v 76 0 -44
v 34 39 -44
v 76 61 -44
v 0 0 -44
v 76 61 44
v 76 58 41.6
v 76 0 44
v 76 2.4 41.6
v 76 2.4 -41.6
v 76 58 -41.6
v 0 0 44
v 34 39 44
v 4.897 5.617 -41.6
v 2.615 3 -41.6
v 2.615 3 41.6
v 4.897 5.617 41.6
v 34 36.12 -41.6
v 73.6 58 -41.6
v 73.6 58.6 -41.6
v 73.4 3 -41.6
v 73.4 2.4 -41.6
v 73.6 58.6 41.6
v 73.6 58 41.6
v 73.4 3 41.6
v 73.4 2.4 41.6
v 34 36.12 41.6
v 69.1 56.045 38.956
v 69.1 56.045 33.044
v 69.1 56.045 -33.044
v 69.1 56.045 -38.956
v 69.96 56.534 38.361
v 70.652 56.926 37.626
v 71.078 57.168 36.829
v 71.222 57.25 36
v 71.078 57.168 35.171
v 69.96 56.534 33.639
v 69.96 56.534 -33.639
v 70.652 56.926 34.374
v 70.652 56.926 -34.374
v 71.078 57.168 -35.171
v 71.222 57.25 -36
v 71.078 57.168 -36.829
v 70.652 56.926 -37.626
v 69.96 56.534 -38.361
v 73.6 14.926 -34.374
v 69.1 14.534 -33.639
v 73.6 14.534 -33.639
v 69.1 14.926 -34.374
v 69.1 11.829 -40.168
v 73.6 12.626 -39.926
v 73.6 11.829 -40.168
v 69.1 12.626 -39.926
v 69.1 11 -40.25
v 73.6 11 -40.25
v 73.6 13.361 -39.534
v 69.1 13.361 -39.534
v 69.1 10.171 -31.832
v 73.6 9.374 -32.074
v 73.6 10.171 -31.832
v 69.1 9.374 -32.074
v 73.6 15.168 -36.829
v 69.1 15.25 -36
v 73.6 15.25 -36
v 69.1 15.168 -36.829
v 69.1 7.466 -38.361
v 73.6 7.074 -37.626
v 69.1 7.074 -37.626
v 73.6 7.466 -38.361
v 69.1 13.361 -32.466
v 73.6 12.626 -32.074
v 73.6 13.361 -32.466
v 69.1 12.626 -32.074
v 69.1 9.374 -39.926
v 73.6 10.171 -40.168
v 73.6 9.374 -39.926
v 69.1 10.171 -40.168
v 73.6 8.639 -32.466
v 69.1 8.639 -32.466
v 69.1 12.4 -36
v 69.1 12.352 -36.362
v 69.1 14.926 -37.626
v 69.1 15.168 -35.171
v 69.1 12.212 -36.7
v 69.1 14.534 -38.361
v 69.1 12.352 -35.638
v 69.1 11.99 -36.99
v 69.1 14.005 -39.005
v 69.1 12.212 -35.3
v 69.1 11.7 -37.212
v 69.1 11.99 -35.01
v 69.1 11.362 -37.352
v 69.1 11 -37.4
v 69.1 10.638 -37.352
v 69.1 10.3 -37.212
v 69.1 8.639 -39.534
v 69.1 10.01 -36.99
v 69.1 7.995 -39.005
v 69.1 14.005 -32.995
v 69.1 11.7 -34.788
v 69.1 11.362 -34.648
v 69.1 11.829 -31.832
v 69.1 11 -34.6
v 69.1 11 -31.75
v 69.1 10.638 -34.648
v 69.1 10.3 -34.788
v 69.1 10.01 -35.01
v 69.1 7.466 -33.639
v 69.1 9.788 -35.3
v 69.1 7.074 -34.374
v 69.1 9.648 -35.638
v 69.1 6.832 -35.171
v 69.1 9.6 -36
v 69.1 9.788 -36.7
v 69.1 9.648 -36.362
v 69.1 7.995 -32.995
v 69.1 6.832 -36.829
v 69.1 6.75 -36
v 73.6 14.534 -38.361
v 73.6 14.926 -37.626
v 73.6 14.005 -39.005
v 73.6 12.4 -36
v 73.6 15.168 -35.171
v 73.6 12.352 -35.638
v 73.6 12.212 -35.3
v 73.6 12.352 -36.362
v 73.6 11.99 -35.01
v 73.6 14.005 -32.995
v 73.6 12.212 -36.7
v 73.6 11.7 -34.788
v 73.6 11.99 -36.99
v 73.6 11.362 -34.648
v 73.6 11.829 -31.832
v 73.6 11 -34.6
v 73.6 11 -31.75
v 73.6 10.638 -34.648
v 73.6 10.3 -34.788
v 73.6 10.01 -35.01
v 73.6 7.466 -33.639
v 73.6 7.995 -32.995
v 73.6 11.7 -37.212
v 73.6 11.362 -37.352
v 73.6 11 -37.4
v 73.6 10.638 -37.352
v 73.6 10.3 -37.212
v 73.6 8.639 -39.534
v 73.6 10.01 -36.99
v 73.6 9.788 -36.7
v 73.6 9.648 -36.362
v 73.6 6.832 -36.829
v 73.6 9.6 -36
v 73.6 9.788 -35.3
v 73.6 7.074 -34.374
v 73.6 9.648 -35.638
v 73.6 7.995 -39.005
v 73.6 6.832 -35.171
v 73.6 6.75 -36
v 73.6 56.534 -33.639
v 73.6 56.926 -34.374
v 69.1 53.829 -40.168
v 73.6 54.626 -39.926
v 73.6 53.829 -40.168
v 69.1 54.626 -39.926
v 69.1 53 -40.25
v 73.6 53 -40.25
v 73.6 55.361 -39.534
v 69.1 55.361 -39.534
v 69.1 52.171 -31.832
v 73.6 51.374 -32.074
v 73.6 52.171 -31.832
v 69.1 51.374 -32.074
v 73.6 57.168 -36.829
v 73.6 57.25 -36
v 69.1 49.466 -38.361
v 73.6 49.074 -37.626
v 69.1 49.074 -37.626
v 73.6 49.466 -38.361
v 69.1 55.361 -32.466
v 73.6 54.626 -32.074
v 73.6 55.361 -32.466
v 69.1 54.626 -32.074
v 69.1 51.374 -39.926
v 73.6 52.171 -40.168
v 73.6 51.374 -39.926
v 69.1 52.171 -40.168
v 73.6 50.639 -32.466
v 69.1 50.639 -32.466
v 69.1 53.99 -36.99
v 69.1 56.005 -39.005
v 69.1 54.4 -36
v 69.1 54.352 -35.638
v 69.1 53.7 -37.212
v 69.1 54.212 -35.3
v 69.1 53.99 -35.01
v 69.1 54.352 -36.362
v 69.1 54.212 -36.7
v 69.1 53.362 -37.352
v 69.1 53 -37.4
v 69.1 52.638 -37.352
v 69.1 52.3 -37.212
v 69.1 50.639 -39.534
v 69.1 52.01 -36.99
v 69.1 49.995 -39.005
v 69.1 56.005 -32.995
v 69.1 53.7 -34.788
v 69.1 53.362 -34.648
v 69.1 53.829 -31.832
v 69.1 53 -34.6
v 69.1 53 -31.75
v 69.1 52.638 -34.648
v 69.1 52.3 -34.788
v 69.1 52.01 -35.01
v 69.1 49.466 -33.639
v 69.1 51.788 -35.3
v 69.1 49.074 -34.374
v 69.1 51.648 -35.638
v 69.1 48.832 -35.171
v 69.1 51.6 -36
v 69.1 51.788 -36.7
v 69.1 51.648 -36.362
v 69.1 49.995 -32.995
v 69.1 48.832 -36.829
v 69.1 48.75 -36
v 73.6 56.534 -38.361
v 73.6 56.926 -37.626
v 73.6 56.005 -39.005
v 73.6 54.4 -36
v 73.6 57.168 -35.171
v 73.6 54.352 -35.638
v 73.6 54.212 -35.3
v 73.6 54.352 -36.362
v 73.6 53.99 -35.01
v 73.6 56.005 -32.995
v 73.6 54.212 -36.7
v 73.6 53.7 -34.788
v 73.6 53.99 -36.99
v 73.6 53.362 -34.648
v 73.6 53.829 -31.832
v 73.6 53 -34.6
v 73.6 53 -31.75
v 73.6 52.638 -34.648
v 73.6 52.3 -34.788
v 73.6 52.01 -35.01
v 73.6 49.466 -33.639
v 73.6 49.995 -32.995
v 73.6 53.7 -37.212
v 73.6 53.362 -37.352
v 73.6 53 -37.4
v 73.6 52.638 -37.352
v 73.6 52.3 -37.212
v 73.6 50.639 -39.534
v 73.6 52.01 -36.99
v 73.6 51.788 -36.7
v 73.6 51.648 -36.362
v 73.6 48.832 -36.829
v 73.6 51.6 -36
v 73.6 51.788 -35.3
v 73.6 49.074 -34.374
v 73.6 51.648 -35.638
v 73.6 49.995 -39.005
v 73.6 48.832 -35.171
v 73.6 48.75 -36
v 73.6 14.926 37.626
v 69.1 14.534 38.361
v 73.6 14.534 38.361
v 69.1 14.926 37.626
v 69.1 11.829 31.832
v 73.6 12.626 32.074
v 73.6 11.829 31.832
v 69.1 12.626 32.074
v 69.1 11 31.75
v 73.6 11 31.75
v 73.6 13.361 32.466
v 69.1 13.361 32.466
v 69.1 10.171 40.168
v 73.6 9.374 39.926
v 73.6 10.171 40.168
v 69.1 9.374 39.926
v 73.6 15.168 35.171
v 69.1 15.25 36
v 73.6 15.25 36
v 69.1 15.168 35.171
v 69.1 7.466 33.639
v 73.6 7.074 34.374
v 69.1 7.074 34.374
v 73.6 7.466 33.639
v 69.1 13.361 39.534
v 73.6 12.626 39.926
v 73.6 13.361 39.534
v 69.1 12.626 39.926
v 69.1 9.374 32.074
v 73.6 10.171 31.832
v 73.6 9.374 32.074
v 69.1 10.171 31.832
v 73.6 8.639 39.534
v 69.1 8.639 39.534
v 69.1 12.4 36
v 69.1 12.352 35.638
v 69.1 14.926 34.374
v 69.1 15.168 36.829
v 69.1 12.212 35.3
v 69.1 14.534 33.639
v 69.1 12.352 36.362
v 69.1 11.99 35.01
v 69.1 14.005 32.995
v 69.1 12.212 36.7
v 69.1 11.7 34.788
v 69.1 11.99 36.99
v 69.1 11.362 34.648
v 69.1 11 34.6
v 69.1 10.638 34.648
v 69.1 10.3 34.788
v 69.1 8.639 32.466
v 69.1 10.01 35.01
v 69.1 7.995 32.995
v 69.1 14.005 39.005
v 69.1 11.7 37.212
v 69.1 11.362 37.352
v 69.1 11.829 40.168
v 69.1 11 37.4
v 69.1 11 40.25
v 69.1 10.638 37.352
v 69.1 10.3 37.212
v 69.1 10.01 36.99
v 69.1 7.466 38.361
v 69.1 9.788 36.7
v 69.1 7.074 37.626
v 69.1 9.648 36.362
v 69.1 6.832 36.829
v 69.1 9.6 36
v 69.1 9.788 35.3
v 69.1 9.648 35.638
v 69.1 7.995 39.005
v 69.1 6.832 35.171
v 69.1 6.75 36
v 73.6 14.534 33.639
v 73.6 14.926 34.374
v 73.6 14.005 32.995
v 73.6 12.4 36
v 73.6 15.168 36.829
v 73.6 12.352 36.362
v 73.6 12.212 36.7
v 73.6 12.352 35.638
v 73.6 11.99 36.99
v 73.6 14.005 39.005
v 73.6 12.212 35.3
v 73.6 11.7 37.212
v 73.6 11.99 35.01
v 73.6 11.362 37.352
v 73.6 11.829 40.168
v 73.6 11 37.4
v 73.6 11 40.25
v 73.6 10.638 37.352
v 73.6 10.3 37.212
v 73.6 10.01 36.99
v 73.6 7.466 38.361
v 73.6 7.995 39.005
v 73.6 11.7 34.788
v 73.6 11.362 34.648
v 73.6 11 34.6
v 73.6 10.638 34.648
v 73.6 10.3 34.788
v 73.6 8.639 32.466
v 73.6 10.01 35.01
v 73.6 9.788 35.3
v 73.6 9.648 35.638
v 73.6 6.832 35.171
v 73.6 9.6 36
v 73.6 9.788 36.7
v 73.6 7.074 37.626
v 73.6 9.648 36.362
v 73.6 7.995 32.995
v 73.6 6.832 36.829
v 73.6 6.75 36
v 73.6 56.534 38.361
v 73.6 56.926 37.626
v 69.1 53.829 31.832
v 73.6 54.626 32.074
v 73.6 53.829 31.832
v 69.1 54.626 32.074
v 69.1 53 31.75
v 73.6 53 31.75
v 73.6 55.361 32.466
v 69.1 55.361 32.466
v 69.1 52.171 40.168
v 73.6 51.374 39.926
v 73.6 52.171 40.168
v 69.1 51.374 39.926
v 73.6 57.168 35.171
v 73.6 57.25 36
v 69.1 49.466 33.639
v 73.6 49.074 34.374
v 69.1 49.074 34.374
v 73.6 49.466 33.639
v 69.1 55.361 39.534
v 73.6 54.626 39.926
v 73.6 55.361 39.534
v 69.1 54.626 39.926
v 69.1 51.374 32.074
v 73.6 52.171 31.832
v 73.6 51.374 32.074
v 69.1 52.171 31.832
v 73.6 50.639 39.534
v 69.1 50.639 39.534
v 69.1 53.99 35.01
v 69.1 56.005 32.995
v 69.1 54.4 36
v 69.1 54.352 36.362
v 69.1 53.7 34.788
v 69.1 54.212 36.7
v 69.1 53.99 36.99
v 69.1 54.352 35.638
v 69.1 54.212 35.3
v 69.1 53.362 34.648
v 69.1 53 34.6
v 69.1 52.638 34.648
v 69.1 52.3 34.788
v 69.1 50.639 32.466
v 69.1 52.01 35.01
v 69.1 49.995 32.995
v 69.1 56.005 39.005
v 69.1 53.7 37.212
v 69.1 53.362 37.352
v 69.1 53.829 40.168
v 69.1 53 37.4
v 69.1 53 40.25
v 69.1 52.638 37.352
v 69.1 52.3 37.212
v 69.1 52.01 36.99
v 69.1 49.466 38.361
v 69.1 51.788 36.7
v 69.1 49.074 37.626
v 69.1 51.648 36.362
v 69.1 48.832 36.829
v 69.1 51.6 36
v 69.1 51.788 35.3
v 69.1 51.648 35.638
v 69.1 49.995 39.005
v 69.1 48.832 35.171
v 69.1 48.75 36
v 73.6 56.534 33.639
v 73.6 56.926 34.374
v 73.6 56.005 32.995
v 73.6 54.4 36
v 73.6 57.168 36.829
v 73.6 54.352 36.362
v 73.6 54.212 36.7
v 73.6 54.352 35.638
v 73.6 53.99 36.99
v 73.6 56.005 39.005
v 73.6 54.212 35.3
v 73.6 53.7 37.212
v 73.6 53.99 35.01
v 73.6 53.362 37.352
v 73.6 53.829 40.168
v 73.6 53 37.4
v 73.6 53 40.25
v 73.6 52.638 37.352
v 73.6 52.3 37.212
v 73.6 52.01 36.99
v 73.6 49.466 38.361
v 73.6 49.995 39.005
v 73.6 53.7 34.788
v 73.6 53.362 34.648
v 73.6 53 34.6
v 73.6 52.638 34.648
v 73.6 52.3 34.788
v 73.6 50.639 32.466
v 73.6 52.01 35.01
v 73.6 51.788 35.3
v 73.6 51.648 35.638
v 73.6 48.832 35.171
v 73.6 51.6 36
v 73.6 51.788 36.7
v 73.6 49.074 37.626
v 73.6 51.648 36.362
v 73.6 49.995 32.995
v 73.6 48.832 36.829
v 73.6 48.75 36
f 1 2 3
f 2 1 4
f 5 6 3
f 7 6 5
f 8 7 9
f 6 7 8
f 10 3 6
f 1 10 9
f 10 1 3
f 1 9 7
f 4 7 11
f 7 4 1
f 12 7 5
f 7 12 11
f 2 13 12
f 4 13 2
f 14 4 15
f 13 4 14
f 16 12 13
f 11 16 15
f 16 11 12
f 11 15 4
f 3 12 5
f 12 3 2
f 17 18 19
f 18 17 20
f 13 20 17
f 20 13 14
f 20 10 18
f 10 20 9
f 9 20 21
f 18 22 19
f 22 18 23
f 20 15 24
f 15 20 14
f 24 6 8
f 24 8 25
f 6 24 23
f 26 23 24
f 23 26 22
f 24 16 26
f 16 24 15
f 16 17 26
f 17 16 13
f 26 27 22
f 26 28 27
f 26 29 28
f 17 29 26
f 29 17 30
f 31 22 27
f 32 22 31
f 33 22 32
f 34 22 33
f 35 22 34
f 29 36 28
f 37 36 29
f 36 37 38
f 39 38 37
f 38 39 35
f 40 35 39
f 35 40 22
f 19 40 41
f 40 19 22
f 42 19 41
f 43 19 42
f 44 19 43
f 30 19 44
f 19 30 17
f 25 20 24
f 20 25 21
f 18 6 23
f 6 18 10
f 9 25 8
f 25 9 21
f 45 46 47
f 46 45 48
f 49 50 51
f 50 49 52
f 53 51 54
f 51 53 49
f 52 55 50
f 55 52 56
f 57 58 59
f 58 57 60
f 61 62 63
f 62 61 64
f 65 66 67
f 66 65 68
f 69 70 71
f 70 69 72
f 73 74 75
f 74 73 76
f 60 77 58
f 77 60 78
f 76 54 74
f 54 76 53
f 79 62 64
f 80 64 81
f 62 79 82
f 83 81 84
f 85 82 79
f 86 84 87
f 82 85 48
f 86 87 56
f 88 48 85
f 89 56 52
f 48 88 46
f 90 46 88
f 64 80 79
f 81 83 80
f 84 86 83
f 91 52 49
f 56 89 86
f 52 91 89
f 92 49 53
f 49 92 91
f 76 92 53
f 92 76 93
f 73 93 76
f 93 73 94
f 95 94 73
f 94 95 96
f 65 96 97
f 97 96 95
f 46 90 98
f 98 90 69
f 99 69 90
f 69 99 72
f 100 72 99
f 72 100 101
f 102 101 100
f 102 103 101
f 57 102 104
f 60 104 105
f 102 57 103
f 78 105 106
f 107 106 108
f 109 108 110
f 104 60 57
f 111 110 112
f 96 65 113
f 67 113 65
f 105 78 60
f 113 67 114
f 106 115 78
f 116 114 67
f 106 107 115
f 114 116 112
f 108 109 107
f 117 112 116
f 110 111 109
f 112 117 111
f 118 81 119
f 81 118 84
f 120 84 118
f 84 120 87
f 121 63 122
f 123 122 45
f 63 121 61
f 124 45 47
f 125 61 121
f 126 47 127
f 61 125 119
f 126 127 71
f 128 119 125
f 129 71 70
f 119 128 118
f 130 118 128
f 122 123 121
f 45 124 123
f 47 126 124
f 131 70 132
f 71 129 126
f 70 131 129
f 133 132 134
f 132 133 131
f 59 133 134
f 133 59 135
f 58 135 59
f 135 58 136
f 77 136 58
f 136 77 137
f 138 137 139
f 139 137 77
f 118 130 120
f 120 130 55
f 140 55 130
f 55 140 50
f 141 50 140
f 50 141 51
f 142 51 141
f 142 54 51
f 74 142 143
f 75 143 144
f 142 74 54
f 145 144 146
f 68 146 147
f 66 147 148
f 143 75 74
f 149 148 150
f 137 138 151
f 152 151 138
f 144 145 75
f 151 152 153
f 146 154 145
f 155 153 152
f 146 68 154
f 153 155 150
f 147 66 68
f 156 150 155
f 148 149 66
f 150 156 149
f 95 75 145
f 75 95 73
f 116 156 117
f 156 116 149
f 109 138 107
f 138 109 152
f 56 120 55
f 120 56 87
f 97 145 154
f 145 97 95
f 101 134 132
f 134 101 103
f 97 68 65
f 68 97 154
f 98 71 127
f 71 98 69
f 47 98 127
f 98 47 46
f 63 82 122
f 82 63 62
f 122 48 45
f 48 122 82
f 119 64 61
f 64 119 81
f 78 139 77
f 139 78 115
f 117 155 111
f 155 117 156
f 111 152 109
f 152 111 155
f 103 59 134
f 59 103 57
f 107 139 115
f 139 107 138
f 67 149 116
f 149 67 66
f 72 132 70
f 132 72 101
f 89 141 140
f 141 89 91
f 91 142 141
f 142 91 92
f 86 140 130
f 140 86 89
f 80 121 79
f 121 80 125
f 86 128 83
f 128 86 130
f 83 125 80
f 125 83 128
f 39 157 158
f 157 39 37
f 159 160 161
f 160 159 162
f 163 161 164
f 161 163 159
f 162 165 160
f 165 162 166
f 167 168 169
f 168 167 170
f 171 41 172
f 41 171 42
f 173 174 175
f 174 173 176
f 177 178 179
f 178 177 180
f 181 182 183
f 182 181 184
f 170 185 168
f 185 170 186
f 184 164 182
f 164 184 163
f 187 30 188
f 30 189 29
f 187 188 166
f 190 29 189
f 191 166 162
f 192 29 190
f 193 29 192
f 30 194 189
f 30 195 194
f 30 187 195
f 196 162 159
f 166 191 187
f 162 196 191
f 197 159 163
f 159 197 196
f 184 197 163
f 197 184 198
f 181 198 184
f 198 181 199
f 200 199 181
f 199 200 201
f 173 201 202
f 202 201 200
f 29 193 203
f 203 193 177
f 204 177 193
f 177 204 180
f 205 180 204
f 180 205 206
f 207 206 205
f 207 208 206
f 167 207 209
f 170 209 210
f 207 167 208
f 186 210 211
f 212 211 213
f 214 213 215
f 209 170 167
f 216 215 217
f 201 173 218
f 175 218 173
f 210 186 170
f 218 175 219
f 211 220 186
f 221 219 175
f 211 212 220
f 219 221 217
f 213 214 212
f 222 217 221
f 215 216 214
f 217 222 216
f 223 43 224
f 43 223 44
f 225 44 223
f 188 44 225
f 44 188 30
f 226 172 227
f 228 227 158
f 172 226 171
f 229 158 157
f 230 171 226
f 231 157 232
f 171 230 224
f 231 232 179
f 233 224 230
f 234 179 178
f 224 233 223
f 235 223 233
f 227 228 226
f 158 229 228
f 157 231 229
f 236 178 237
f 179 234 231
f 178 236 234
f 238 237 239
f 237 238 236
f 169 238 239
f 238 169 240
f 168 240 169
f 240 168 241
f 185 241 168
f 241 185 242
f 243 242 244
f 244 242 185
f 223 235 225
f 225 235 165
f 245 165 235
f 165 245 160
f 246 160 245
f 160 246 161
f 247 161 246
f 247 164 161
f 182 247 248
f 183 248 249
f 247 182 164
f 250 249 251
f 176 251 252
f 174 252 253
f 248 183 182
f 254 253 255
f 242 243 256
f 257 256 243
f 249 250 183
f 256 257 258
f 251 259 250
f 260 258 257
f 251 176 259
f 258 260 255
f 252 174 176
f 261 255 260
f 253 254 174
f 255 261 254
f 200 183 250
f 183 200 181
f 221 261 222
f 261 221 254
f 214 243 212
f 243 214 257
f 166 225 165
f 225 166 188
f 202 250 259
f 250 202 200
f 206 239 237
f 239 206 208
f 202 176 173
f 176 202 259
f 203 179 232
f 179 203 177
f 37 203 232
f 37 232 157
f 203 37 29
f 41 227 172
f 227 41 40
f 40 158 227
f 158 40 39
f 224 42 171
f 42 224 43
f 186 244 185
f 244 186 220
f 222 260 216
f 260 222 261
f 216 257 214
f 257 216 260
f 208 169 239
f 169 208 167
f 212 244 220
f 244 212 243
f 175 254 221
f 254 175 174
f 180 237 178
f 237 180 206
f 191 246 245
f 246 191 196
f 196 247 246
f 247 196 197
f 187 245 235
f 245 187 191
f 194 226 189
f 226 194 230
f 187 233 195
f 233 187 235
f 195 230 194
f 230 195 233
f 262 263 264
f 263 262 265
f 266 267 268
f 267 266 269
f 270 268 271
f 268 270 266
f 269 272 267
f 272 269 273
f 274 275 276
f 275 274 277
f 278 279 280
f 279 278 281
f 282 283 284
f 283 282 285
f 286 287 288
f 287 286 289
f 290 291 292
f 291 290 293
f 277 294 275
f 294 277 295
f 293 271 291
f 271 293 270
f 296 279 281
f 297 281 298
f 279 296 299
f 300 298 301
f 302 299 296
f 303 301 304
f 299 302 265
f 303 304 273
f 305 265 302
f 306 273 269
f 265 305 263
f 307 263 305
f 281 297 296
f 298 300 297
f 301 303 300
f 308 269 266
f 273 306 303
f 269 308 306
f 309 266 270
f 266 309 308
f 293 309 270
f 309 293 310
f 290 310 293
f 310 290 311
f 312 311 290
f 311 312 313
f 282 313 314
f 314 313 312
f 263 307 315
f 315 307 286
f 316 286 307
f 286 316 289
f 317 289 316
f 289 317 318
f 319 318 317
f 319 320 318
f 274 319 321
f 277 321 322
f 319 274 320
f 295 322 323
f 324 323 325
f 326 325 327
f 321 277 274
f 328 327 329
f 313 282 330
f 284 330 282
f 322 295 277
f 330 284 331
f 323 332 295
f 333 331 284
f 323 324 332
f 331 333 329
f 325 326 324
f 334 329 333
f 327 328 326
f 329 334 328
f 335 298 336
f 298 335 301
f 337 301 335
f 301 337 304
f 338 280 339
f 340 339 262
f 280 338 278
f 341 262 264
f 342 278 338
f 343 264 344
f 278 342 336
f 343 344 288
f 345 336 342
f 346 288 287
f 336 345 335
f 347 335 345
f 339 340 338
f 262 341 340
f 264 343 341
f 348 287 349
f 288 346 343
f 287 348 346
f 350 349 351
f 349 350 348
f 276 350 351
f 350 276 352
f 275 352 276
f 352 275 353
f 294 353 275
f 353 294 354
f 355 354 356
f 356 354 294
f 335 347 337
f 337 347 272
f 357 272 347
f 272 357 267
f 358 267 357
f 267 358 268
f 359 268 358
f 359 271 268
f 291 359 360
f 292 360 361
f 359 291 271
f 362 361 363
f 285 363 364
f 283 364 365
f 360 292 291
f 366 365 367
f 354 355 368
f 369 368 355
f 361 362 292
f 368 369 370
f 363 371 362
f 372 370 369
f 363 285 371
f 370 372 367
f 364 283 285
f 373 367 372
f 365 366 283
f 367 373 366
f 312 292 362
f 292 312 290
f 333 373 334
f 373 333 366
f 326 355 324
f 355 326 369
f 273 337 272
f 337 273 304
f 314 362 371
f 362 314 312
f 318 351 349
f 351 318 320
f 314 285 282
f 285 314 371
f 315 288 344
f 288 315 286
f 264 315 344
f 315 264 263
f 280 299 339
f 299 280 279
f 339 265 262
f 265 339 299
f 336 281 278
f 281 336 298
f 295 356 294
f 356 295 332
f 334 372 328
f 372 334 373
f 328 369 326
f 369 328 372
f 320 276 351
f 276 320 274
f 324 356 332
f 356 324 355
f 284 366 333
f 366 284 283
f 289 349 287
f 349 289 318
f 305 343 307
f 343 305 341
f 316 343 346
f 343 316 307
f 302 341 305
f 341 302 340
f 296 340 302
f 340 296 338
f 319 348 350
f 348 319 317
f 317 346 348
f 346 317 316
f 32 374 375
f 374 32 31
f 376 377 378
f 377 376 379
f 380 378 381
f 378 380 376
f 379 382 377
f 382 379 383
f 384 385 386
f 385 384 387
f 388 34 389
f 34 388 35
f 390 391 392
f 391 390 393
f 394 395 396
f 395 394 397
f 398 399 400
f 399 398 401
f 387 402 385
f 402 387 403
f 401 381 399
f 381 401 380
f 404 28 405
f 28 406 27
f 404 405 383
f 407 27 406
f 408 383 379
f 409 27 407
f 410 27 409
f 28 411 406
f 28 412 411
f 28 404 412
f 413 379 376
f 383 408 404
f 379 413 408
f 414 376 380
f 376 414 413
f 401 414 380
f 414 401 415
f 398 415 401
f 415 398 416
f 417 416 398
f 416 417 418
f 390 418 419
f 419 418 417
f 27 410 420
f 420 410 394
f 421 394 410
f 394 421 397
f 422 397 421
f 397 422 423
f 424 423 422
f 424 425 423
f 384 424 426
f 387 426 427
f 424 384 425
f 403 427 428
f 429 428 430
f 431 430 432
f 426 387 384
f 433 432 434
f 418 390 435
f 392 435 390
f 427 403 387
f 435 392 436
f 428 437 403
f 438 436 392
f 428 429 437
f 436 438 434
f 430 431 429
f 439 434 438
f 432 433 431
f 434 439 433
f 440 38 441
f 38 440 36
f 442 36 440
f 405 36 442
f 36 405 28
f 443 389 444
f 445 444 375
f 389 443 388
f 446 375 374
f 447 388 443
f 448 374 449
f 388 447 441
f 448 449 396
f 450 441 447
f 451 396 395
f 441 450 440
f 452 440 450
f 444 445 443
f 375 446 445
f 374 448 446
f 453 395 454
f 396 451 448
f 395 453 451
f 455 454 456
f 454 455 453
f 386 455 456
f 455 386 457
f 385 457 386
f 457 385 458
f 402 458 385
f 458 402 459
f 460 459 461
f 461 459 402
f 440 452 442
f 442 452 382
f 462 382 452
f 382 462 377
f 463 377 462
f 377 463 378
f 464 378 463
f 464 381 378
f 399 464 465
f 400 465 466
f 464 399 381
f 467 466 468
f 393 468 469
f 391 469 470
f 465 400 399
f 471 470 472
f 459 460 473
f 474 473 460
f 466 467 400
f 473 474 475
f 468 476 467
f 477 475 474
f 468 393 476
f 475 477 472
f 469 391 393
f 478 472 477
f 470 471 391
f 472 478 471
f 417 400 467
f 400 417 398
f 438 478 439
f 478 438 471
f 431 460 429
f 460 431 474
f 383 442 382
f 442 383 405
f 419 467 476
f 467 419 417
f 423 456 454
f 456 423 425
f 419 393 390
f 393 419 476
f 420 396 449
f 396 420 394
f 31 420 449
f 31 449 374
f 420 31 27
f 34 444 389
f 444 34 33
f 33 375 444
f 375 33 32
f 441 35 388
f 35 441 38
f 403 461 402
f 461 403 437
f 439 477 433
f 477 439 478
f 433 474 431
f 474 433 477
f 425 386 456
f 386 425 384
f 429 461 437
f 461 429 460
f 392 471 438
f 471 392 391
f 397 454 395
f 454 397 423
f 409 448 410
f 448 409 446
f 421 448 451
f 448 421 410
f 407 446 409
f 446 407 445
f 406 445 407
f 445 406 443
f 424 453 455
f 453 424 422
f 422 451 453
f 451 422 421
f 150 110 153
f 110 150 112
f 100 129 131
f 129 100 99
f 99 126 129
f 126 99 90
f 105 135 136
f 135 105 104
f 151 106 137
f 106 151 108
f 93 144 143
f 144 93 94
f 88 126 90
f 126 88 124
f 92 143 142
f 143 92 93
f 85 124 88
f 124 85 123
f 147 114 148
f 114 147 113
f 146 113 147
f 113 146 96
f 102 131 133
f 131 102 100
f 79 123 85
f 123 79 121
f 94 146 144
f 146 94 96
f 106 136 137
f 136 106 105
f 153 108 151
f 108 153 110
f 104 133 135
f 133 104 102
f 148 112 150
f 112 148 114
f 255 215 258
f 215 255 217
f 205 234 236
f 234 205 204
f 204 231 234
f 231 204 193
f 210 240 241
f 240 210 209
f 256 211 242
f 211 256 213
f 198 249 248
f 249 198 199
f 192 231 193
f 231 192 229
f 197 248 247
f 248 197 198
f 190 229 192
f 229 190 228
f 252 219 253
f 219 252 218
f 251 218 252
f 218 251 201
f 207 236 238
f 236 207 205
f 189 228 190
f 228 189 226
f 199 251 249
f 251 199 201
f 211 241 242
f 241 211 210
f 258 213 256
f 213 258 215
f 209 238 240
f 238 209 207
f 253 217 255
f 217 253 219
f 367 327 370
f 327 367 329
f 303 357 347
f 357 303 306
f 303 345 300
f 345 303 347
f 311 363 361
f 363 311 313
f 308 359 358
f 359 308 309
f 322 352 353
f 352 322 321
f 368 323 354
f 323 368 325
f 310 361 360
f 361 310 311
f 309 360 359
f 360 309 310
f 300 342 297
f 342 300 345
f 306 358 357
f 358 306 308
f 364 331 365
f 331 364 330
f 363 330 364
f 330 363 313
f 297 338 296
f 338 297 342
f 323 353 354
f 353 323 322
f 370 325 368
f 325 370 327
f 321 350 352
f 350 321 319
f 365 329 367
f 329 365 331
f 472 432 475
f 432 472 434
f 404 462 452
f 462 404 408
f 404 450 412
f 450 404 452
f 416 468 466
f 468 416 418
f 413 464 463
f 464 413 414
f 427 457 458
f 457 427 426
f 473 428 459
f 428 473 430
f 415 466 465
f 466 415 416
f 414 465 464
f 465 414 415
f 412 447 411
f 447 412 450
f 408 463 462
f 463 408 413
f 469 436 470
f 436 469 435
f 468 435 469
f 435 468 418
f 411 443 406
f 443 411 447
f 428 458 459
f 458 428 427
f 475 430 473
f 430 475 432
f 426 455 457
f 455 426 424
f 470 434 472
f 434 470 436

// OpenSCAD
// PCMonitorX sloped desktop stand. Units: mm.
// OLED/ESP32 physical dimensions remain undefined until measured.

part = "body"; // "body", "cover", or "both"
preview_only = true; // Enables shell-only preview before dimensions are recorded.

case_width = 88;
case_depth = 76;
front_rise = 39;
back_height = 61;
wall = 2.4;
floor = 3.0;
rear_cover_thickness = 2.4;
cover_clearance = 0.25;
screw_clearance = 2.8;
screw_head_diameter = 5.5;
vent_slot_width = 2.0;
vent_pitch = 5.0;
standoff_height = 5.0;
standoff_diameter = 6.5;
mount_screw_clearance = 2.4;

// Fill these from hardware/measurement_worksheet.md; do not derive from diagonal size.
oled_pcb_width = undef;
oled_pcb_height = undef;
oled_pcb_thickness = undef;
oled_window_width = undef;
oled_window_height = undef;
oled_window_offset_x = undef; // from PCB left edge
oled_window_offset_y = undef; // from PCB top edge
oled_hole_spacing_x = undef;
oled_hole_spacing_y = undef;
oled_hole_offset_x = undef; // hole-pattern centre offset from PCB centre, across width
oled_hole_offset_y = undef; // hole-pattern centre offset from PCB centre, along height
esp32_board_width = undef;
esp32_board_length = undef;
esp32_hole_spacing_x = undef;
esp32_hole_spacing_y = undef;
esp32_hole_offset_x = undef; // hole-pattern centre offset from PCB centre, across width
esp32_hole_offset_y = undef; // hole-pattern centre offset from PCB centre, along length
esp32_board_center_depth = 45;
esp32_board_center_width = 0;

// Measure the complete plastic two-cell holder, not the bare cell dimensions.
battery_holder_depth = undef; // along case depth (X)
battery_holder_width = undef; // across case width (Z)
battery_holder_height = undef; // above inside floor (Y)
battery_holder_center_depth = undef; // X position; place the open end toward removable rear cover
battery_holder_center_width = undef; // Z position
battery_bay_clearance = 0.7;
battery_rail_thickness = 2.0;
battery_rail_height = 3.0;

// Buck converter uses four measured board holes; use a separate insulating support if it has none.
buck_board_length = undef;
buck_board_width = undef;
buck_board_height = undef;
buck_hole_spacing_depth = undef;
buck_hole_spacing_width = undef;
buck_hole_offset_depth = undef;
buck_hole_offset_width = undef;
buck_board_center_depth = undef;
buck_board_center_width = undef;
buck_mount_screw_clearance = 2.4;

// Optional 2S protection board; needed if the holder/cells are not already a protected 2S assembly.
bms_board_length = undef;
bms_board_width = undef;
bms_board_height = undef;
bms_hole_spacing_depth = undef;
bms_hole_spacing_width = undef;
bms_hole_offset_depth = undef;
bms_hole_offset_width = undef;
bms_board_center_depth = undef;
bms_board_center_width = undef;
bms_mount_screw_clearance = 2.4;

oled_ready = !is_undef(oled_pcb_width) && !is_undef(oled_pcb_height) &&
             !is_undef(oled_pcb_thickness) && !is_undef(oled_window_width) &&
             !is_undef(oled_window_height) && !is_undef(oled_window_offset_x) &&
             !is_undef(oled_window_offset_y);
oled_mount_ready = oled_ready && !is_undef(oled_hole_spacing_x) &&
                   !is_undef(oled_hole_spacing_y) && !is_undef(oled_hole_offset_x) &&
                   !is_undef(oled_hole_offset_y);
esp_ready = !is_undef(esp32_board_width) && !is_undef(esp32_board_length) &&
            !is_undef(esp32_hole_spacing_x) && !is_undef(esp32_hole_spacing_y) &&
            !is_undef(esp32_hole_offset_x) && !is_undef(esp32_hole_offset_y);
battery_ready = !is_undef(battery_holder_depth) && !is_undef(battery_holder_width) &&
                !is_undef(battery_holder_height) && !is_undef(battery_holder_center_depth) &&
                !is_undef(battery_holder_center_width);
buck_ready = !is_undef(buck_board_length) && !is_undef(buck_board_width) &&
             !is_undef(buck_board_height) && !is_undef(buck_hole_spacing_depth) &&
             !is_undef(buck_hole_spacing_width) && !is_undef(buck_hole_offset_depth) &&
             !is_undef(buck_hole_offset_width) && !is_undef(buck_board_center_depth) &&
             !is_undef(buck_board_center_width);
bms_ready = !is_undef(bms_board_length) && !is_undef(bms_board_width) &&
            !is_undef(bms_board_height) && !is_undef(bms_hole_spacing_depth) &&
            !is_undef(bms_hole_spacing_width) && !is_undef(bms_hole_offset_depth) &&
            !is_undef(bms_hole_offset_width) && !is_undef(bms_board_center_depth) &&
            !is_undef(bms_board_center_width);
front_angle = atan(front_rise / 34); // displayed face runs from x=0 to x=34
front_run = 34;

module side_profile() {
    polygon(points=[[0,0],[case_depth,0],[case_depth,back_height],[front_run,front_rise]]);
}

module inner_profile() {
    polygon(points=[[wall,floor],[case_depth-wall,floor],
                    [case_depth-wall,back_height-wall],[front_run,front_rise-wall*1.2]]);
}

module shell() {
    difference() {
        linear_extrude(height=case_width, center=true) side_profile();
        translate([0,0,0]) linear_extrude(height=case_width-2*wall, center=true) inner_profile();

        // Full-width rear opening for service access and the removable cover.
        translate([case_depth-wall-0.2, wall, -case_width/2+wall])
            cube([wall+2, back_height-floor-wall, case_width-2*wall]);

        // Ventilation through rear wall, above the internal mounting region.
        for (zpos=[-case_width/2+12 : vent_pitch : case_width/2-12])
            for (ypos=[back_height*0.48 : 7 : back_height-12])
                translate([case_depth-wall-0.4,ypos,zpos-vent_slot_width/2])
                    cube([wall+1,1.3,vent_slot_width]);

        // The OLED viewing window and PCB recess are only cut with measured dimensions.
        if (oled_ready) oled_cuts();
    }
}

module oled_cuts() {
    // Transform local X to the sloped face tangent; local Z points into the enclosure.
    face_center = [front_run/2,front_rise/2,0];
    angle = front_angle;
    translate([face_center[0],face_center[1],0]) rotate([90,0,angle]) {
        // PCB recess and small retaining lip/ledge, measured PCB footprint.
        translate([-oled_pcb_height/2,-oled_pcb_width/2,-0.1])
            cube([oled_pcb_height,oled_pcb_width,wall+oled_pcb_thickness+0.5]);
        // Active area aperture is positioned from PCB centre using measured offsets.
        local_x = oled_pcb_height/2 - oled_window_offset_y - oled_window_height/2;
        local_y = oled_window_offset_x - oled_pcb_width/2 + oled_window_width/2;
        translate([local_x-oled_window_height/2,local_y-oled_window_width/2,-2])
            cube([oled_window_height,oled_window_width,wall+4]);
    }
}

module mounting_posts() {
    if (oled_mount_ready) {
        translate([front_run/2,front_rise/2,0]) rotate([90,0,front_angle])
            for (sx=[-1,1], sy=[-1,1])
                translate([oled_hole_offset_y+sx*oled_hole_spacing_y/2,
                           oled_hole_offset_x+sy*oled_hole_spacing_x/2,wall])
                    difference() {
                        cylinder(h=standoff_height,d=standoff_diameter,$fn=32);
                        translate([0,0,-0.2]) cylinder(h=standoff_height+0.4,d=mount_screw_clearance,$fn=24);
                    }
    }
    if (esp_ready) {
        // ESP32 posts sit on the inner floor. Adjust depth/width placement to the USB opening and wiring.
        for (sx=[-1,1], sy=[-1,1])
            translate([esp32_board_center_depth+esp32_hole_offset_y+sy*esp32_hole_spacing_y/2,
                       floor,
                       esp32_board_center_width+esp32_hole_offset_x+sx*esp32_hole_spacing_x/2])
                rotate([-90,0,0])
                difference() {
                    cylinder(h=standoff_height,d=standoff_diameter,$fn=32);
                    translate([0,0,-0.2]) cylinder(h=standoff_height+0.4,d=mount_screw_clearance,$fn=24);
                }
    }
    if (buck_ready) {
        for (sx=[-1,1], sz=[-1,1])
            translate([buck_board_center_depth+buck_hole_offset_depth+sx*buck_hole_spacing_depth/2,
                       floor,
                       buck_board_center_width+buck_hole_offset_width+sz*buck_hole_spacing_width/2])
                rotate([-90,0,0])
                difference() {
                    cylinder(h=standoff_height,d=standoff_diameter,$fn=32);
                    translate([0,0,-0.2]) cylinder(h=standoff_height+0.4,d=buck_mount_screw_clearance,$fn=24);
                }
    }
    if (bms_ready) {
        for (sx=[-1,1], sz=[-1,1])
            translate([bms_board_center_depth+bms_hole_offset_depth+sx*bms_hole_spacing_depth/2,
                       floor,
                       bms_board_center_width+bms_hole_offset_width+sz*bms_hole_spacing_width/2])
                rotate([-90,0,0])
                difference() {
                    cylinder(h=standoff_height,d=standoff_diameter,$fn=32);
                    translate([0,0,-0.2]) cylinder(h=standoff_height+0.4,d=bms_mount_screw_clearance,$fn=24);
                }
    }
}

module battery_rails() {
    if (battery_ready) {
        bay_x = battery_holder_center_depth-battery_holder_depth/2-battery_bay_clearance;
        bay_z = battery_holder_center_width-battery_holder_width/2-battery_bay_clearance;
        bay_w = battery_holder_width+2*battery_bay_clearance;
        // Side rails retain the holder; front stop leaves it removable through the rear opening.
        rail_run = min(battery_holder_depth+2*battery_bay_clearance,
                       case_depth-wall-bay_x-1.5);
        translate([bay_x,floor,bay_z-battery_rail_thickness])
            cube([rail_run,battery_rail_height,battery_rail_thickness]);
        translate([bay_x,floor,bay_z+bay_w])
            cube([rail_run,battery_rail_height,battery_rail_thickness]);
        translate([bay_x-battery_rail_thickness,floor,bay_z-battery_rail_thickness])
            cube([battery_rail_thickness,battery_rail_height,bay_w+2*battery_rail_thickness]);
    }
}

module usb_opening() {
    // Configurable rectangular opening at the lower rear edge; verify connector orientation.
    usb_width = 13;
    usb_height = 8;
    translate([case_depth-wall-1, floor+2, -usb_width/2])
        cube([wall+2,usb_height,usb_width]);
}

module rear_bosses() {
    boss_start = case_depth-rear_cover_thickness-4.5;
    for (zpos=[-case_width/2+8,case_width/2-8], ypos=[floor+8,back_height-8])
        translate([boss_start,ypos,zpos]) rotate([0,90,0])
            difference() {
                cylinder(h=4.5,d=8.5,$fn=32);
                translate([0,0,-0.2]) cylinder(h=4.9,d=screw_clearance,$fn=24);
            }
}

module body() {
    difference() {
        union() { shell(); mounting_posts(); rear_bosses(); battery_rails(); }
        usb_opening();
        // Cover attachment holes through the rear flange.
        for (zpos=[-case_width/2+8,case_width/2-8], ypos=[floor+8,back_height-8])
            translate([case_depth-rear_cover_thickness-4.5,ypos,zpos]) rotate([0,90,0])
                cylinder(h=7,d=screw_clearance,$fn=24);
    }
}

module cover() {
    difference() {
        translate([case_depth-rear_cover_thickness, wall+cover_clearance,
                   -case_width/2+wall+cover_clearance])
            cube([rear_cover_thickness,back_height-floor-2*wall-2*cover_clearance,
                  case_width-2*wall-2*cover_clearance]);
        for (zpos=[-case_width/2+8,case_width/2-8], ypos=[floor+8,back_height-8])
            translate([case_depth-rear_cover_thickness-0.2,ypos,zpos]) rotate([0,90,0])
                cylinder(h=rear_cover_thickness+0.5,d=screw_clearance,$fn=24);
        // Recess screw heads slightly on the exterior side.
        for (zpos=[-case_width/2+8,case_width/2-8], ypos=[floor+8,back_height-8])
            translate([case_depth-1.2,ypos,zpos]) rotate([0,90,0])
                cylinder(h=1.2,d=screw_head_diameter,$fn=32);
    }
}

if (!oled_ready && !preview_only)
    echo("OLED bezel/cavity omitted: enter measured OLED PCB/window dimensions.");
if (oled_ready && !oled_mount_ready)
    echo("OLED screw posts omitted: enter measured OLED hole spacing and offsets.");
if (!esp_ready)
    echo("ESP32 mounting posts omitted: enter measured board and hole dimensions.");
if (!battery_ready)
    echo("Removable battery bay omitted: enter the measured 2-cell holder dimensions and position.");
if (!buck_ready)
    echo("Buck converter posts omitted: enter measured board and hole dimensions.");
if (!bms_ready)
    echo("2S protection-board posts omitted: enter measured board and hole dimensions if a separate board is used.");
if (battery_ready && battery_holder_height+floor > back_height-wall)
    echo("WARNING: measured battery holder height exceeds the enclosure interior height.");
if (part == "body") body();
else if (part == "cover") cover();
else if (part == "both") { body(); cover(); }
